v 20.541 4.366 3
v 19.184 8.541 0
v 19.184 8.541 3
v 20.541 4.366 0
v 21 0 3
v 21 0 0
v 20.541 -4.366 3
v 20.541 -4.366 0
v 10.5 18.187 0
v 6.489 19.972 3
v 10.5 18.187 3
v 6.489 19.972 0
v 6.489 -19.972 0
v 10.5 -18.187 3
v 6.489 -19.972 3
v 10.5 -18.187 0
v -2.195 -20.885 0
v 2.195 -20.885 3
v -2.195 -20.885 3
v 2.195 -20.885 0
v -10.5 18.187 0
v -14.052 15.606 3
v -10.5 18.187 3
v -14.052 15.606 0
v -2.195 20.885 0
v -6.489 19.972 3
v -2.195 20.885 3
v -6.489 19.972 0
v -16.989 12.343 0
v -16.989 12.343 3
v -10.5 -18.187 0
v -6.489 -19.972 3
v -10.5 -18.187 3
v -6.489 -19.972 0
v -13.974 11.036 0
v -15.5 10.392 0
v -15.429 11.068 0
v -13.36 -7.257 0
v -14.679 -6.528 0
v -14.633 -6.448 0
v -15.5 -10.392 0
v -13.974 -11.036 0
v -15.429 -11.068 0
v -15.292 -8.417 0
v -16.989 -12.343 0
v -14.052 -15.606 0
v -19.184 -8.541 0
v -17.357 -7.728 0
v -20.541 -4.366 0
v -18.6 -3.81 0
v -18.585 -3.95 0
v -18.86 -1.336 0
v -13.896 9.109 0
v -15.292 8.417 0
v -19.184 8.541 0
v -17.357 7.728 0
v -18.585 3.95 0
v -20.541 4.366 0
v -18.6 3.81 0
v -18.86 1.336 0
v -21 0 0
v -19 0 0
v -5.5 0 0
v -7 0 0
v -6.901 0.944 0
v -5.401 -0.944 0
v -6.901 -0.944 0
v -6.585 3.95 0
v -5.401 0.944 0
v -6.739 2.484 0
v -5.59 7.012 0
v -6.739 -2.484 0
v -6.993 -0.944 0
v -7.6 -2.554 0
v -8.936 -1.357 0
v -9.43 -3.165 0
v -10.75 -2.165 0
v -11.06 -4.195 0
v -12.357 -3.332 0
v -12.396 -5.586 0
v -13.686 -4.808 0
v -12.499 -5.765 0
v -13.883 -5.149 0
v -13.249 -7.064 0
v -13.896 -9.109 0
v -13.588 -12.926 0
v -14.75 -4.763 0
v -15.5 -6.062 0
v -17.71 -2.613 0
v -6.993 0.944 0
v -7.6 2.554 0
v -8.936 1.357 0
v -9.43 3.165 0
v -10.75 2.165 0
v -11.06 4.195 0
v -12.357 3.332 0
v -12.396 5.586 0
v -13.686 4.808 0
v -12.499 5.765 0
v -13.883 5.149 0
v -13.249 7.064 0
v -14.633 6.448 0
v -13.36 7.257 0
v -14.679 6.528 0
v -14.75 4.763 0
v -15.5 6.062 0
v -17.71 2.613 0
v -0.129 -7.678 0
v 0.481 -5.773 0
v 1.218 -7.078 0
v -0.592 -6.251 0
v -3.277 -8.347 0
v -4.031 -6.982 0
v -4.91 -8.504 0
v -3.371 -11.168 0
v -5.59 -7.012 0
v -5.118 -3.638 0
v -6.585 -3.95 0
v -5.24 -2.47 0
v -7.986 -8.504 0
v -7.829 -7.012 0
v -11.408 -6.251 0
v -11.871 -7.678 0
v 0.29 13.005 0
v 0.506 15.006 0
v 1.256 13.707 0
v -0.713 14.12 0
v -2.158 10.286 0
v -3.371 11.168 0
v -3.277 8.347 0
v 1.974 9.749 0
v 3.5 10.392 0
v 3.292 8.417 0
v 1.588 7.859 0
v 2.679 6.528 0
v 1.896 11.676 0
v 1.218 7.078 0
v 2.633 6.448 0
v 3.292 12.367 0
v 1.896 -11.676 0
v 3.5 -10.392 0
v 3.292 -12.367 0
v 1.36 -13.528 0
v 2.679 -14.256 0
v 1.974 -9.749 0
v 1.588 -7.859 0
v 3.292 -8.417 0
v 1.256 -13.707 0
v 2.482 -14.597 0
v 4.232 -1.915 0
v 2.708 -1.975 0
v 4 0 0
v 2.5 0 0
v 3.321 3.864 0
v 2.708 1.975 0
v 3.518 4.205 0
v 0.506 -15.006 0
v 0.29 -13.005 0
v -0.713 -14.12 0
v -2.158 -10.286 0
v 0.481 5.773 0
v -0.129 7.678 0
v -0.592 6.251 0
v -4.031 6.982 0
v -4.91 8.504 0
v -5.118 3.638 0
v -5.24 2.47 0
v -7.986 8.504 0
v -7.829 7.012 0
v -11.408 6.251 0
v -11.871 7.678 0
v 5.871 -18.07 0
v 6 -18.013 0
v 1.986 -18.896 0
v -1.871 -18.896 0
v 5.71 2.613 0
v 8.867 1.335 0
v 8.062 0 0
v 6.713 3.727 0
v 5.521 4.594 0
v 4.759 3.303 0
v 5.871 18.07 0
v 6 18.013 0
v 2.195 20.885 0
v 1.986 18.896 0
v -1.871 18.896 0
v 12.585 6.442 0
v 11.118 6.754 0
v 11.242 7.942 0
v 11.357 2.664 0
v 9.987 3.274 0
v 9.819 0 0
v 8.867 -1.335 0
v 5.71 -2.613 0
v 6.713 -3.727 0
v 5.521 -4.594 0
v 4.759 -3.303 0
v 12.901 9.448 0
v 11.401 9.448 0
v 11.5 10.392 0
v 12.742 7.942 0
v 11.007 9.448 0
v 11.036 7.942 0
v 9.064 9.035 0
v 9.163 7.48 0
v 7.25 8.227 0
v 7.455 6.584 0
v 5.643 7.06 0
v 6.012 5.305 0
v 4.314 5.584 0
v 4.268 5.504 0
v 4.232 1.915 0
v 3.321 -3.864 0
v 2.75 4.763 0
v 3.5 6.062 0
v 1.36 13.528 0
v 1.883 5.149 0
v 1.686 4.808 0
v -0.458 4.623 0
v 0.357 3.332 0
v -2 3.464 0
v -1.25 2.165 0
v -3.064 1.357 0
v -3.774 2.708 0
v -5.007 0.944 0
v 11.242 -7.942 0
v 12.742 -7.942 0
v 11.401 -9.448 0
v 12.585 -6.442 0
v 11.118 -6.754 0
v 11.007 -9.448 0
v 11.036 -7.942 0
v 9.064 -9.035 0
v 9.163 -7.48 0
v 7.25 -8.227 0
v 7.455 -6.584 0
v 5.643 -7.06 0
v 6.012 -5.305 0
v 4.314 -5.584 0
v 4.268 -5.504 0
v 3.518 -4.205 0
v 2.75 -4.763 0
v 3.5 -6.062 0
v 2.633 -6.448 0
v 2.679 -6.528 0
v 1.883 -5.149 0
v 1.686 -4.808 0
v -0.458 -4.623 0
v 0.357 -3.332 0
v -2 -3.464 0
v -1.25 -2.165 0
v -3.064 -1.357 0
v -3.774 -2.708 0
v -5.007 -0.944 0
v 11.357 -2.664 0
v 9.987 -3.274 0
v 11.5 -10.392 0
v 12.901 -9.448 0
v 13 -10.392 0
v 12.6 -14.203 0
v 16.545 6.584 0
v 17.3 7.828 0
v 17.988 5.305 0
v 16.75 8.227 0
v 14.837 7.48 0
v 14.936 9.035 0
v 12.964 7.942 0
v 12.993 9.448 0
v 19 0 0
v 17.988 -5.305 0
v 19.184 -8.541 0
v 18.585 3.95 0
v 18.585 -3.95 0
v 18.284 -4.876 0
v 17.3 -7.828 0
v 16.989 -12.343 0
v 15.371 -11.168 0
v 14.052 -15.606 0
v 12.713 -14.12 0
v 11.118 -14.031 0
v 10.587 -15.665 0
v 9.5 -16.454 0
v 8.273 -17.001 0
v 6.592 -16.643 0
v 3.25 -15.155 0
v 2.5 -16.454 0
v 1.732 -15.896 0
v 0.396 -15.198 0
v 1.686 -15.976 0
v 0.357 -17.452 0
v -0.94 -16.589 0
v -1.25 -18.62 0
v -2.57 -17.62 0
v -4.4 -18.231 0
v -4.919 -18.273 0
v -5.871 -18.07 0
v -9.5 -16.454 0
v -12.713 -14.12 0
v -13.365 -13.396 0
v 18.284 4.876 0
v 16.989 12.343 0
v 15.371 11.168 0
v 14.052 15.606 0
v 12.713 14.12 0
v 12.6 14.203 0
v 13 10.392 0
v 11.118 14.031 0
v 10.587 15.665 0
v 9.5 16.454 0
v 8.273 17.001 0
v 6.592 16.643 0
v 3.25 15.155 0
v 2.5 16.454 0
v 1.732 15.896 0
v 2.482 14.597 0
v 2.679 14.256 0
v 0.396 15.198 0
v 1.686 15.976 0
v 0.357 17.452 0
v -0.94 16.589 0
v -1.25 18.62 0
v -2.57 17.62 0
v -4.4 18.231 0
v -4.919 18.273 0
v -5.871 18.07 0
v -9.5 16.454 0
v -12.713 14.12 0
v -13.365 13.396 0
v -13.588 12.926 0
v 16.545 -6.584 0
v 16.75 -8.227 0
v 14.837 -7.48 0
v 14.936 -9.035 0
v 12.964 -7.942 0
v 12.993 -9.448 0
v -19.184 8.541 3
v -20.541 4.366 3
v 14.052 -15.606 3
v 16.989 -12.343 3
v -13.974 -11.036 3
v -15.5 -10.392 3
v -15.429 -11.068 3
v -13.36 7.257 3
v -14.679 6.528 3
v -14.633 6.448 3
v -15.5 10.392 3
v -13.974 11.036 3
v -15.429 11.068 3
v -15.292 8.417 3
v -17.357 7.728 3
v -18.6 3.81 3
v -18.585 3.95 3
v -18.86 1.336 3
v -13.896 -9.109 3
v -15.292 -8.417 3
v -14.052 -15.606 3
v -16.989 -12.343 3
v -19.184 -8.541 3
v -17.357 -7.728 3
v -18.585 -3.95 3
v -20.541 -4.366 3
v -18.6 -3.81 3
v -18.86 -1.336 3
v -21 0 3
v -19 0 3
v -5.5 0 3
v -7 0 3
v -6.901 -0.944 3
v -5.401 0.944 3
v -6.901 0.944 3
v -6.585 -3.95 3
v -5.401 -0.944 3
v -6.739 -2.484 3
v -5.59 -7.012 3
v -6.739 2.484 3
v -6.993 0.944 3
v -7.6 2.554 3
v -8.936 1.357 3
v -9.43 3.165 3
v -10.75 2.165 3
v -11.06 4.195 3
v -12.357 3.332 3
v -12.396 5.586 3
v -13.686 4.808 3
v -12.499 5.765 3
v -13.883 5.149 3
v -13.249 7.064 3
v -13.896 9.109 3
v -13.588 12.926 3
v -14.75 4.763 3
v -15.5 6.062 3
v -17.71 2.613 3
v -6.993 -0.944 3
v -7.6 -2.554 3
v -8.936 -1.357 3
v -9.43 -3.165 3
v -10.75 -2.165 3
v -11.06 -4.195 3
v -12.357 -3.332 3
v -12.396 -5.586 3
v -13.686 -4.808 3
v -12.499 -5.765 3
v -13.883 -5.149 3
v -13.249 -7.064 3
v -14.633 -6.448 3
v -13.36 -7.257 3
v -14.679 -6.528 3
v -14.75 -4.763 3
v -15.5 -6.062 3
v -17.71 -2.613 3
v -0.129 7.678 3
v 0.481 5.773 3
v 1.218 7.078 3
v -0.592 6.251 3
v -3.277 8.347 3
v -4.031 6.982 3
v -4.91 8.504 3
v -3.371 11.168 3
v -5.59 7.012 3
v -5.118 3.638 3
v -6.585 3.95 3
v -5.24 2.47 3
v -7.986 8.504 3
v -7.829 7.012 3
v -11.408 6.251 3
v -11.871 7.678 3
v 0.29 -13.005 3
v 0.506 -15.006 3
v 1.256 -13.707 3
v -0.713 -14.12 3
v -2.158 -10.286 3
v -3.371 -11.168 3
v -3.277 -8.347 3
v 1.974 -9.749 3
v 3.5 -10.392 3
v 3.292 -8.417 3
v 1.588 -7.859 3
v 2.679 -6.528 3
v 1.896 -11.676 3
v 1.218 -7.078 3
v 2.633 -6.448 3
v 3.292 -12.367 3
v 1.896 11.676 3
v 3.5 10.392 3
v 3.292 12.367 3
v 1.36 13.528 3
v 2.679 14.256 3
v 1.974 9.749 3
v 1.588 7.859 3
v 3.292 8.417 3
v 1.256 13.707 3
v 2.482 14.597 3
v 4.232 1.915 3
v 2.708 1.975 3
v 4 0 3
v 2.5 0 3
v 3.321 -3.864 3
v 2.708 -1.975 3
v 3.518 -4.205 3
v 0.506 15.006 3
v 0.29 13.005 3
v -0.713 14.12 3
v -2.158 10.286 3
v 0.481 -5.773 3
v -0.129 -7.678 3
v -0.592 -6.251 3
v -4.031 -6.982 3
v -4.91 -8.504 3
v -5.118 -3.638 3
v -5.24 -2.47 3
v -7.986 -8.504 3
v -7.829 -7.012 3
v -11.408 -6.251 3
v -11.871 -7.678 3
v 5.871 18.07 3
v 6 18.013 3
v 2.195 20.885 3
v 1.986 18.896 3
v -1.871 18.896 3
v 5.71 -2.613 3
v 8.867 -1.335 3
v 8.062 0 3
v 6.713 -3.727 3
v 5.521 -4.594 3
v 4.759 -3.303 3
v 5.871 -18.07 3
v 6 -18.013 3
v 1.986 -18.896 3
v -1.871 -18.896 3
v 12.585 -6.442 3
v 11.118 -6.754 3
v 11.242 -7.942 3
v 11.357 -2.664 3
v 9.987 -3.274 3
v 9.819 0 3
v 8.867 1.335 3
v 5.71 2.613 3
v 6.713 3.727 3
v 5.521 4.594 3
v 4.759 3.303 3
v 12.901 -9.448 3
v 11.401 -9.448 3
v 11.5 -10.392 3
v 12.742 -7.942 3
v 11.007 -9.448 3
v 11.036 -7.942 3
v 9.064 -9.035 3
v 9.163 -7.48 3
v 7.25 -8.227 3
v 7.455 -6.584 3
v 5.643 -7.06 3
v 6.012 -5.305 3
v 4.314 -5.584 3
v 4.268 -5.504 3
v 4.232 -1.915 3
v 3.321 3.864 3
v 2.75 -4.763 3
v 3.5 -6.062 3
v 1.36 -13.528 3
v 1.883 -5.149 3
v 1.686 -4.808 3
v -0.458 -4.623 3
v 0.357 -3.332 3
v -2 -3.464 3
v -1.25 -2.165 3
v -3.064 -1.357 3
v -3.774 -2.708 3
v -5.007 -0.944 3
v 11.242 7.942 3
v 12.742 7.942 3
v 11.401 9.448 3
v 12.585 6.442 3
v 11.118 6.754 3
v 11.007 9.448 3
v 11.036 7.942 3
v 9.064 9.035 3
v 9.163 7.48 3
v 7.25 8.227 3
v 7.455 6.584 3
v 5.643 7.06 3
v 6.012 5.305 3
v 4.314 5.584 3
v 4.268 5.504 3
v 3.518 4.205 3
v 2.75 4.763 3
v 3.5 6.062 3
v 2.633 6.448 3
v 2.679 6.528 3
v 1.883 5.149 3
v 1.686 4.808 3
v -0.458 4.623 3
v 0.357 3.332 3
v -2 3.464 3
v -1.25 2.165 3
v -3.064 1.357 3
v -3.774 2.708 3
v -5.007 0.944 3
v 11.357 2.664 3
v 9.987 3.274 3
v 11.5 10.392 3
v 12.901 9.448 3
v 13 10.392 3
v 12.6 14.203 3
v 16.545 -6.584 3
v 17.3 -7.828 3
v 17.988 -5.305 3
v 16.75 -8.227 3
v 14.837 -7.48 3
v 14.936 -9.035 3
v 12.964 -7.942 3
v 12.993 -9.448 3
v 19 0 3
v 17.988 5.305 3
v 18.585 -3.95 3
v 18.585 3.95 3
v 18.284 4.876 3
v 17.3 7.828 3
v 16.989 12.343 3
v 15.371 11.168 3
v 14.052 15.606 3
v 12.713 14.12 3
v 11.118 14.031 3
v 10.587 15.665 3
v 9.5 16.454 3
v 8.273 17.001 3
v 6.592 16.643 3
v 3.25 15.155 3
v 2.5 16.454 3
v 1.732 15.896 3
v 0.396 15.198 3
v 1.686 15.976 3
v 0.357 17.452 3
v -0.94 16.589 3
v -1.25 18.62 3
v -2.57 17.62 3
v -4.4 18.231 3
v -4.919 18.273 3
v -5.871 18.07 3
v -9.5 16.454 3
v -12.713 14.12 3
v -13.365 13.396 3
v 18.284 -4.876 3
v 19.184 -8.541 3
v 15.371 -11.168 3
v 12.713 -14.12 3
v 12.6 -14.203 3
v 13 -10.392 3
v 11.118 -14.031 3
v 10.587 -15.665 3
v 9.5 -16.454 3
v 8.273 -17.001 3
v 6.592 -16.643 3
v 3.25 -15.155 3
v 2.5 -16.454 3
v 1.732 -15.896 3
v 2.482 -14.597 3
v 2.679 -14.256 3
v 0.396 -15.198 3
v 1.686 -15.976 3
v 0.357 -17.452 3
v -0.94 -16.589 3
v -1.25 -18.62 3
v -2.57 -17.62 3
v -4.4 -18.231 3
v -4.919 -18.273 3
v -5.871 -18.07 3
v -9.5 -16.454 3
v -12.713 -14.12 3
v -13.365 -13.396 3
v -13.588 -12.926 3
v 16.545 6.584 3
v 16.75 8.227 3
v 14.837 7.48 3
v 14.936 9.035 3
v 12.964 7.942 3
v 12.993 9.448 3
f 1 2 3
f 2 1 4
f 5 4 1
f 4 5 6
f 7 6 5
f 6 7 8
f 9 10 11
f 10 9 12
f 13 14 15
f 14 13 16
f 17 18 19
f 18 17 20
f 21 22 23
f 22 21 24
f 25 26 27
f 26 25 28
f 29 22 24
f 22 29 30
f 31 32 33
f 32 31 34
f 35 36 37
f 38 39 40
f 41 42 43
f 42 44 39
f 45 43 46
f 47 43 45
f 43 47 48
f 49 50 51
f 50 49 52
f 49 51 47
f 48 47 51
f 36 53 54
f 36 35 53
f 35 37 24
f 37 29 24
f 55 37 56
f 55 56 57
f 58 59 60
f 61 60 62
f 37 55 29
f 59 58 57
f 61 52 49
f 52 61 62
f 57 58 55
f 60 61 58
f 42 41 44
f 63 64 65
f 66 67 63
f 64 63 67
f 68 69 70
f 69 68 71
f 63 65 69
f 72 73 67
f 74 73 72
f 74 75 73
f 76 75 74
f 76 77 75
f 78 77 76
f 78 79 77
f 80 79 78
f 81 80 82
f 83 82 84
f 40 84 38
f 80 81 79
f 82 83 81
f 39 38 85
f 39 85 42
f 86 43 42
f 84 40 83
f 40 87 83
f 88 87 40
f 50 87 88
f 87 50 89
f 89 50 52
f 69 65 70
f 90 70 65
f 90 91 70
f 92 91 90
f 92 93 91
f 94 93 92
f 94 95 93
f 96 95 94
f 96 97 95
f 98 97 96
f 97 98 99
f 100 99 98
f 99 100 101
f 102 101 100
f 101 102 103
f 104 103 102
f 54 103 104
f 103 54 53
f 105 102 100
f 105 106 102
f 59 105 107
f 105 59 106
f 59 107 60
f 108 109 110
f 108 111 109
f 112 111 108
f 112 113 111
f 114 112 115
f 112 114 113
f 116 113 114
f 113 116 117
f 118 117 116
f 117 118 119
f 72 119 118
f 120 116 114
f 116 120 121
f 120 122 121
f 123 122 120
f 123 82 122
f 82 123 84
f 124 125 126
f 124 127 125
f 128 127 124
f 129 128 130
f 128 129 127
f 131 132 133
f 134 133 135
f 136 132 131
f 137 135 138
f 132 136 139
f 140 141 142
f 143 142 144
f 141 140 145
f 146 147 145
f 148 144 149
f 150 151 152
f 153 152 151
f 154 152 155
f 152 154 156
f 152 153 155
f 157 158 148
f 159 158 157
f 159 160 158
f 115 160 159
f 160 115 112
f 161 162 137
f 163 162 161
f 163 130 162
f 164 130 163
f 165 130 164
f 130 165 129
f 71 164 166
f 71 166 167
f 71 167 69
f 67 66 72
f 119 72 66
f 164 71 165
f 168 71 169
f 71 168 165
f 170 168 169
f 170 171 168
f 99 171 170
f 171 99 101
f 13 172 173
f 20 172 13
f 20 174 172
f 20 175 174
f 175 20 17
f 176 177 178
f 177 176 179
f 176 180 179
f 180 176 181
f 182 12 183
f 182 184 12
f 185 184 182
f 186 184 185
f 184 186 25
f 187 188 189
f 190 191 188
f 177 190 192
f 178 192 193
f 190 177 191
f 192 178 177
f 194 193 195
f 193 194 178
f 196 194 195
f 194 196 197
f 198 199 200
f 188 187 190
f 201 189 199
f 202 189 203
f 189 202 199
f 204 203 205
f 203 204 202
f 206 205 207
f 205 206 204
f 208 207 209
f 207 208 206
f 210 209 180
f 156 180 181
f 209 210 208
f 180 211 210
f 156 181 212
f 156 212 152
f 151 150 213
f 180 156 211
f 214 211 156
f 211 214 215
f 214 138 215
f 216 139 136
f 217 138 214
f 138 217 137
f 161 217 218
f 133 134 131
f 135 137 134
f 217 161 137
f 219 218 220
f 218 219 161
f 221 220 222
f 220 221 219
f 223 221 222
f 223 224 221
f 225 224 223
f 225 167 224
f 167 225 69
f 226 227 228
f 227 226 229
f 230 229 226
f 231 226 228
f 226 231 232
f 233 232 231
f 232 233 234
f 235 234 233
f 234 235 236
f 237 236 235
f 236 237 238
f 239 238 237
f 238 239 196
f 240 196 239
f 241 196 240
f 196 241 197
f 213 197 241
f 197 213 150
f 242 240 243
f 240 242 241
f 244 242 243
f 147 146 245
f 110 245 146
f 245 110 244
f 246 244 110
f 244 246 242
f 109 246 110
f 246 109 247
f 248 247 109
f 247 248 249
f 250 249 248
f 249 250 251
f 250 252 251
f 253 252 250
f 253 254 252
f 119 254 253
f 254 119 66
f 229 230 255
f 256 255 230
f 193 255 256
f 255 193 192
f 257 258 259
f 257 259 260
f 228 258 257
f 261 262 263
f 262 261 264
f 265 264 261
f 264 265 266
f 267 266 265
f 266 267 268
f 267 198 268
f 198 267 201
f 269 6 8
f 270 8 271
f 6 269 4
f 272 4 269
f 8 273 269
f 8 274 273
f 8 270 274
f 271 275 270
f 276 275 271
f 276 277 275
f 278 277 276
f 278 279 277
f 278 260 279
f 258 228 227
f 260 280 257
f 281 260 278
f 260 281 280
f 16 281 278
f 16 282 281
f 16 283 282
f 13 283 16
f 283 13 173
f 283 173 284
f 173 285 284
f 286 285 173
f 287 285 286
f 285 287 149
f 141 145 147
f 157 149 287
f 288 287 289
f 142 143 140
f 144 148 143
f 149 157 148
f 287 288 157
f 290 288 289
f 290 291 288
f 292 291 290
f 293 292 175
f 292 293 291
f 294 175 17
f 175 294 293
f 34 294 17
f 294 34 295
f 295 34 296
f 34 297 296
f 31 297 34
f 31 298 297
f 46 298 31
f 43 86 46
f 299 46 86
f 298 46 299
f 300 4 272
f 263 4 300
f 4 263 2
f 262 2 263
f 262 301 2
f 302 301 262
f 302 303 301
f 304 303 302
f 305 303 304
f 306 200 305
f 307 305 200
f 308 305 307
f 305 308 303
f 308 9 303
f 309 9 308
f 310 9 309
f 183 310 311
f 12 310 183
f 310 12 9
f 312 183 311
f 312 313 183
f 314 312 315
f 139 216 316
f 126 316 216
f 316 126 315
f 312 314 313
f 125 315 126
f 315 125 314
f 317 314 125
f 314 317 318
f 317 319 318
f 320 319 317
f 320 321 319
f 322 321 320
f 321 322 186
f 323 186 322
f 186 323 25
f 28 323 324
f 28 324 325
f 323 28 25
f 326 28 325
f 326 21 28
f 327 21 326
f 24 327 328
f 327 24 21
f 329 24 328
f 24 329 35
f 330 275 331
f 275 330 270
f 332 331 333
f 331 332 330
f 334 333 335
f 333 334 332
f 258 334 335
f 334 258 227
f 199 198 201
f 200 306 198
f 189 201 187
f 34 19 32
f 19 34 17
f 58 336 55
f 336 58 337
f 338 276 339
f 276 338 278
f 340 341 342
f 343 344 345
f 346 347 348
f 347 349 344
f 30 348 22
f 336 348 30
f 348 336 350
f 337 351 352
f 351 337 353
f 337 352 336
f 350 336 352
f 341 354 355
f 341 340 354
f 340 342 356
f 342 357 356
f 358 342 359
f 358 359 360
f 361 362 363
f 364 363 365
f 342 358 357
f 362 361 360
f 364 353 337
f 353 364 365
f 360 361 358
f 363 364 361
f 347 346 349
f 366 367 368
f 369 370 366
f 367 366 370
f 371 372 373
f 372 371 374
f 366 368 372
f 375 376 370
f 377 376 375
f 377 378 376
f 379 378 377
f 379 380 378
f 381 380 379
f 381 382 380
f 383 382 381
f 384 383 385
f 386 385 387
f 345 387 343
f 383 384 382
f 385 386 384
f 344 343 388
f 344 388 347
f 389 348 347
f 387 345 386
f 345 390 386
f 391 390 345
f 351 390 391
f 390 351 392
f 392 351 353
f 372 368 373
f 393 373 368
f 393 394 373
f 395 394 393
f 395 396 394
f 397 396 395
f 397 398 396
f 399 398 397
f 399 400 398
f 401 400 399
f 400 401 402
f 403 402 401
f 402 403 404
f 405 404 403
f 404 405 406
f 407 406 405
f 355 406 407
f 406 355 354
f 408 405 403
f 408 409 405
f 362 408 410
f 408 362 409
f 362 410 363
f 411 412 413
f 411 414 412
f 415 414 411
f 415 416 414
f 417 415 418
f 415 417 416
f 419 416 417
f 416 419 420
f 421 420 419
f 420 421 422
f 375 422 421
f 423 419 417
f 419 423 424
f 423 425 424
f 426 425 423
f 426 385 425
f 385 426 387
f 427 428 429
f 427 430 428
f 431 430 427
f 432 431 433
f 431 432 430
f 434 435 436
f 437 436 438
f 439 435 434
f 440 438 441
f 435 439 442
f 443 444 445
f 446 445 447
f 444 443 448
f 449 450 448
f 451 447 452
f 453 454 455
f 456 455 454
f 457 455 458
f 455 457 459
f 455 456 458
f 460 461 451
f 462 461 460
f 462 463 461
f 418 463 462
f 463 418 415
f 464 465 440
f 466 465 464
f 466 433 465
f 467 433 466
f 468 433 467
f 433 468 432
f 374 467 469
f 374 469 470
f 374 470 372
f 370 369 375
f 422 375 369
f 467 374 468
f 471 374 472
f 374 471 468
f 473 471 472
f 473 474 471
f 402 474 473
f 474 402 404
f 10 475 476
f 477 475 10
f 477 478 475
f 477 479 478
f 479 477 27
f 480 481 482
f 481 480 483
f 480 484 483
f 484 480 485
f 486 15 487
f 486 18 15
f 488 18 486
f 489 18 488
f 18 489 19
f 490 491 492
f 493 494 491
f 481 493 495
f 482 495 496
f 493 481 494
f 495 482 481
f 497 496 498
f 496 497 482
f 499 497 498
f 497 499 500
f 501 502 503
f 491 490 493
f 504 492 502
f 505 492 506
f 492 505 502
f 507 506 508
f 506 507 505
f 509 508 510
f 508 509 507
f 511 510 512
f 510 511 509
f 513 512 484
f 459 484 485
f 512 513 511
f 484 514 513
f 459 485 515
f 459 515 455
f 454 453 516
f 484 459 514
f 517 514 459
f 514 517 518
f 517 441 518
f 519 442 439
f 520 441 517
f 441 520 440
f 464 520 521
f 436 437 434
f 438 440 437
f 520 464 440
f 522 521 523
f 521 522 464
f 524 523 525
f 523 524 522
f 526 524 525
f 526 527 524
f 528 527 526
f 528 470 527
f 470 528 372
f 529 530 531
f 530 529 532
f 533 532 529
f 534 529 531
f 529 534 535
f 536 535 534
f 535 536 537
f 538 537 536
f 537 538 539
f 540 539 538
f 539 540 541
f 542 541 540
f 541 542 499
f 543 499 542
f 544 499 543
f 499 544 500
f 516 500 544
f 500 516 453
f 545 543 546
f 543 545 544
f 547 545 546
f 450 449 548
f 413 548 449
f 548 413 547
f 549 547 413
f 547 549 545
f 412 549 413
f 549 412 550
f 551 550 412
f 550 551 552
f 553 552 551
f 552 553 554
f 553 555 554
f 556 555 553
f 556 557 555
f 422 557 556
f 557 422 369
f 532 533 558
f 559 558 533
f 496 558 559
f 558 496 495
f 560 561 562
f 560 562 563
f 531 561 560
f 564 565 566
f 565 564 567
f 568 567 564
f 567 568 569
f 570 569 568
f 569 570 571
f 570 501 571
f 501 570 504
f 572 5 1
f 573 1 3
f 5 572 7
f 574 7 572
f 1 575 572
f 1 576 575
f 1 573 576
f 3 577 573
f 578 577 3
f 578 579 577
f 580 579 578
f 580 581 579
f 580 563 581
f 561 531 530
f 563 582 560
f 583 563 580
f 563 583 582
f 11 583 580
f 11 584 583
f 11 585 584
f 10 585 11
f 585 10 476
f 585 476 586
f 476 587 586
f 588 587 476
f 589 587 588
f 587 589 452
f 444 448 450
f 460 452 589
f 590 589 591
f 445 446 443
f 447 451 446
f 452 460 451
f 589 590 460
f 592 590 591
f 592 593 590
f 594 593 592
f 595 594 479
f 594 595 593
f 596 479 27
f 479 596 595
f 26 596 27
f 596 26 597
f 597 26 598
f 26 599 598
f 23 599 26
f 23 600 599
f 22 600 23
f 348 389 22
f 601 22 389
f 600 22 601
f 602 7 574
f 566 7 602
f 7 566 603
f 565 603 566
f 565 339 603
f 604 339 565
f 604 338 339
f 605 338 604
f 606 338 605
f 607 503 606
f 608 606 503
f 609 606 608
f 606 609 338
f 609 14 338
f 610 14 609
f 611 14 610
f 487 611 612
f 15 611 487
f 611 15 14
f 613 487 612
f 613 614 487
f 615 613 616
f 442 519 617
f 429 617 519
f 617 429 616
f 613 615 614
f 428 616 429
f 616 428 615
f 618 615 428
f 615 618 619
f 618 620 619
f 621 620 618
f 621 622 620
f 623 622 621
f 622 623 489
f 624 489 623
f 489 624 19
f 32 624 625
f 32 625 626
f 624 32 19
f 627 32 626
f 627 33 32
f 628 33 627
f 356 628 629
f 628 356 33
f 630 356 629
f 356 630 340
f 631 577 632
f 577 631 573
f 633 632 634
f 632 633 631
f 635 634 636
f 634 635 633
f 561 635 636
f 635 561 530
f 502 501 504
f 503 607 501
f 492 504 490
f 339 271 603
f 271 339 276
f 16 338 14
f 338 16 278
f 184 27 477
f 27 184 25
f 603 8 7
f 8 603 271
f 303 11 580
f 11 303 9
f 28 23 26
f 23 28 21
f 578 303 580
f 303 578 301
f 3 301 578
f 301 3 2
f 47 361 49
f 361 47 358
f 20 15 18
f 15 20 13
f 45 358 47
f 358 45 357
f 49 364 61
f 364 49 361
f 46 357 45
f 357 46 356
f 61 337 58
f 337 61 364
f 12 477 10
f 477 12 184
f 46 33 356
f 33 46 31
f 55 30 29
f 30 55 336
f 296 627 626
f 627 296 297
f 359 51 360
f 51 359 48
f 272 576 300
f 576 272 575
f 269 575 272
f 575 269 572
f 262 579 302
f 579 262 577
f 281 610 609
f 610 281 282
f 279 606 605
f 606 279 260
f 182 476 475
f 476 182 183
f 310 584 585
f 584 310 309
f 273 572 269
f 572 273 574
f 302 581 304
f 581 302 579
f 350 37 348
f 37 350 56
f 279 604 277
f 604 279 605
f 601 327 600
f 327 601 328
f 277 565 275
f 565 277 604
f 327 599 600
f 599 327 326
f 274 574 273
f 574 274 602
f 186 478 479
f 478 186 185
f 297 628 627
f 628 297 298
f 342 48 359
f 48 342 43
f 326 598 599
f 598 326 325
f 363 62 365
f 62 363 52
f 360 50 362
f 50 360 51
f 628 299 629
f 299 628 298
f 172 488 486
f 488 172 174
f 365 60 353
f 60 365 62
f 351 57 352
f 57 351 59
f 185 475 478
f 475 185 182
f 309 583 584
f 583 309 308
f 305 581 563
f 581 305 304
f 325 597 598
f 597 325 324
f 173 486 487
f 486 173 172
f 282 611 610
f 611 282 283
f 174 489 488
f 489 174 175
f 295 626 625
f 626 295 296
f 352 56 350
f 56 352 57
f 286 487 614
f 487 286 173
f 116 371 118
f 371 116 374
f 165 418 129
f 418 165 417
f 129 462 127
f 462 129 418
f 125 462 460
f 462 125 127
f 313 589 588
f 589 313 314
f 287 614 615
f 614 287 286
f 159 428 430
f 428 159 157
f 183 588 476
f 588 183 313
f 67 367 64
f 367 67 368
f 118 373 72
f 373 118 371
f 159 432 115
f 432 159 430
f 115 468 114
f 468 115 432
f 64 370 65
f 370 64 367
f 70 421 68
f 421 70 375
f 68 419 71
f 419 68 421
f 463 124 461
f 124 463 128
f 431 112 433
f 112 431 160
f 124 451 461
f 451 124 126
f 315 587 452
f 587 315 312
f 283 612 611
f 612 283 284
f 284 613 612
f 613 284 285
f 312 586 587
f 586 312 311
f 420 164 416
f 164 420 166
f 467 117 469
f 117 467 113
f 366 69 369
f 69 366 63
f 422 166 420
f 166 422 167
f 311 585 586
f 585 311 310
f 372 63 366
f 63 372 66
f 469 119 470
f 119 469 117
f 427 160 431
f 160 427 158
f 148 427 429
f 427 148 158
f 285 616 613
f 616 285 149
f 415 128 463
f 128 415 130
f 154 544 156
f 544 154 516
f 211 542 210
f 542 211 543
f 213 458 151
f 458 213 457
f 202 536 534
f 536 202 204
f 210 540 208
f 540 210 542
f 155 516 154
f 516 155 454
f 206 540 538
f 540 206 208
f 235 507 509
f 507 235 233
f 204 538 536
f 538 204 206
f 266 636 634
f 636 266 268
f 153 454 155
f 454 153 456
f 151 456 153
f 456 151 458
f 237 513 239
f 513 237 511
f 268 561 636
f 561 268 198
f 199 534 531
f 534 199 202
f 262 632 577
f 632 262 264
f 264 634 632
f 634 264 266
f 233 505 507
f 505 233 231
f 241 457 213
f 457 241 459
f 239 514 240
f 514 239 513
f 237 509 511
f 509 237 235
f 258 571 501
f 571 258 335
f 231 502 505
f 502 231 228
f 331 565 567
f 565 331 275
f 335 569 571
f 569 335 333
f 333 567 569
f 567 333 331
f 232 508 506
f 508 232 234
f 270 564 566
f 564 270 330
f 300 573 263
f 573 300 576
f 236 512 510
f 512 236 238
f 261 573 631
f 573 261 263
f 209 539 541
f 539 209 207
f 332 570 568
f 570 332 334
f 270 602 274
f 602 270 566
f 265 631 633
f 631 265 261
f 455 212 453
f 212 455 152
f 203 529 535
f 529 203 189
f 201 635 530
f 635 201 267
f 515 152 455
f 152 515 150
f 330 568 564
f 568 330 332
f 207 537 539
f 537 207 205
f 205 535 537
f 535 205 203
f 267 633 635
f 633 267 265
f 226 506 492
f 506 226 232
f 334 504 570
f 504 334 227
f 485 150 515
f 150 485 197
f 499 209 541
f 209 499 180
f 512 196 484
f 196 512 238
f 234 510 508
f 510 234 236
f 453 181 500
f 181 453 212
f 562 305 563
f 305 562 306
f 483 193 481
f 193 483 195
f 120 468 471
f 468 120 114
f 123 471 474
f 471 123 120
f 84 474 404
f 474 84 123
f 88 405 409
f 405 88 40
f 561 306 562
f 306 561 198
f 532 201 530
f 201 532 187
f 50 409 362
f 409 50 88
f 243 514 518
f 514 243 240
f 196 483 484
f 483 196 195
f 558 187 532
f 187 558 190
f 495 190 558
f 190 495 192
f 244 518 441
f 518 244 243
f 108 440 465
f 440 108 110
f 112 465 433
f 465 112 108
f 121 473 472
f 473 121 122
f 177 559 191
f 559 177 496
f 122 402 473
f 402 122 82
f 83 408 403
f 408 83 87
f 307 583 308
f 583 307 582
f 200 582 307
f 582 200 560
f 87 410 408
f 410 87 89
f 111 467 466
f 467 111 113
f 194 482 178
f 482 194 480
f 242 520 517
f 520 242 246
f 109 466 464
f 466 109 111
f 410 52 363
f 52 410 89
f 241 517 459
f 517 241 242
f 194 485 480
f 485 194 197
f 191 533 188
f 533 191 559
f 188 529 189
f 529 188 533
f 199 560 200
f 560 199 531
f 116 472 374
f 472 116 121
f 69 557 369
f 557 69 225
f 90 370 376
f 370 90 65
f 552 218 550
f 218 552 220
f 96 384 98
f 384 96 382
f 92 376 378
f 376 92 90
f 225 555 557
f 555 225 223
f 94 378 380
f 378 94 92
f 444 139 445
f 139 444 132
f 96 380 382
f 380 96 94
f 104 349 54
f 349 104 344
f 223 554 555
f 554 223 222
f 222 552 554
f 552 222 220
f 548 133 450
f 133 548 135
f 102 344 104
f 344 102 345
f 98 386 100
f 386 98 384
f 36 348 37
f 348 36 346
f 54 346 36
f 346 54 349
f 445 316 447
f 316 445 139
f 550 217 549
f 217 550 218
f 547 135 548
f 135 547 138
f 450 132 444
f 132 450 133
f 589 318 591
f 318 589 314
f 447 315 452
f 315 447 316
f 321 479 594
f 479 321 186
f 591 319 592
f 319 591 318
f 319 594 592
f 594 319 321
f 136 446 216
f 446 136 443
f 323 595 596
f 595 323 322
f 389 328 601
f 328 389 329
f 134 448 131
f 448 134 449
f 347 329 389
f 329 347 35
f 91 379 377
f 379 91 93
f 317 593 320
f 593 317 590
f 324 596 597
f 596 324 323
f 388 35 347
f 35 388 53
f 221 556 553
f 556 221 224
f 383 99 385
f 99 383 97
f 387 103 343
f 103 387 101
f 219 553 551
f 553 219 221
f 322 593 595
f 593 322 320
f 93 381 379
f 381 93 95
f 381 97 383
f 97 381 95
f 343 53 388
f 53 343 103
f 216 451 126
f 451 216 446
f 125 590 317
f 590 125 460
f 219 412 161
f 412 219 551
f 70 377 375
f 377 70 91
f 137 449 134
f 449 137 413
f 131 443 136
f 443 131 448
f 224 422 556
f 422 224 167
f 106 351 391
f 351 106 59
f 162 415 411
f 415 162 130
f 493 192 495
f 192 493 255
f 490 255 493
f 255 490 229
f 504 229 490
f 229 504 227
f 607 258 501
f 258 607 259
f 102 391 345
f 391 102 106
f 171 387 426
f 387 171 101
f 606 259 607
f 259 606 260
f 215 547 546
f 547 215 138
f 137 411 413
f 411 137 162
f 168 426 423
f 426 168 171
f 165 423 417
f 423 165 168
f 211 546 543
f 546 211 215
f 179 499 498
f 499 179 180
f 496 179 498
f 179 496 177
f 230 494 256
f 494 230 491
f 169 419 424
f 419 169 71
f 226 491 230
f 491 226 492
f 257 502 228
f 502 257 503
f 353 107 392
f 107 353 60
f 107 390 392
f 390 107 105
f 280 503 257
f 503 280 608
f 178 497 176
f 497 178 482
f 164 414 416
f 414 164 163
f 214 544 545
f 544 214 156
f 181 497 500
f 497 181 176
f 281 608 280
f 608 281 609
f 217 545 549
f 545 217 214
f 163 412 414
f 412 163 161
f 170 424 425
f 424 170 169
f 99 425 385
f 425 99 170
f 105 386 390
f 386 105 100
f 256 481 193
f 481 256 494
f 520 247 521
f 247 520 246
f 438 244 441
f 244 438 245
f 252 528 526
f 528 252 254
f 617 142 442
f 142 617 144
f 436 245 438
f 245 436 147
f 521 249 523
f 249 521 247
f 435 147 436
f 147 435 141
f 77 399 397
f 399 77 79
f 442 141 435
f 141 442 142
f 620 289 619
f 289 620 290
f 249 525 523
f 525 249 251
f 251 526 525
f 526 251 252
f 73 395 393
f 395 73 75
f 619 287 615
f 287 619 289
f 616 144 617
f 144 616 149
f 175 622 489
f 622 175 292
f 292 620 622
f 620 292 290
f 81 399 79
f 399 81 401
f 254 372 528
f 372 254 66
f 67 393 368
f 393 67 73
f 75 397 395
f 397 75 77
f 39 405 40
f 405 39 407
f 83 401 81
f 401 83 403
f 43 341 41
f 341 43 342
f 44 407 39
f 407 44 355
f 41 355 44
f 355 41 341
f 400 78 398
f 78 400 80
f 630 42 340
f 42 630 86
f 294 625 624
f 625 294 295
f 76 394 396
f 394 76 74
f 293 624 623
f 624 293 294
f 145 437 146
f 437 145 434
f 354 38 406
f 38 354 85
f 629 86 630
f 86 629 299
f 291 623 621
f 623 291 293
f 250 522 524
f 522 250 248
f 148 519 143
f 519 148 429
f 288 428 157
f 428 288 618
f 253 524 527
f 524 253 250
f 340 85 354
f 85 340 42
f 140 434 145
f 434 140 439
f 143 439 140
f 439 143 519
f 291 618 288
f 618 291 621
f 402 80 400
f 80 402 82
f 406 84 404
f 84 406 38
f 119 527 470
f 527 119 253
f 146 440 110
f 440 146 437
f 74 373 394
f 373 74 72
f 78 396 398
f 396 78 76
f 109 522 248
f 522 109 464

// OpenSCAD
module concentrics(r, tbar, tgap, z) {
  for (i = [0:(tbar+tgap):(r/2)]) {
      difference() {
	cylinder(r=r/2-i, h=z);
	translate([0,0,-1])
	  cylinder(r=r/2-i-tbar, h=z+2);
      }
    }
}


module moire(r, tbar, tgap, z, s) {
  concentrics(r, tbar, tgap, z);
  translate([s,0,0])
    concentrics(r, tbar, tgap, z);
}

module trimoire(r, tbar, tgap, z, s) {
  for  (i = [0:120:359]) {
    rotate([0,0,i])
      translate([s,0,0])
      concentrics(r, tbar, tgap, z);
  }

}



module pentmoire(r, tbar, tgap, z, s) {

  for (i = [0:72:359]) {
    rotate([0,0,i])
      translate([s,0,0])
      concentrics(r, tbar, tgap, z);
  }
}



//translate([50, 50, 0]) concentrics(20, 1,2, 3);
//$fn=50;
//pentmoire(38, 2, 10, 3, 8);

difference() {
  cylinder(r=42/2, h=3);
  translate([0,0,-1])
  cylinder(r=38/2, h=5);
}
intersection() {
  cylinder(r=38/2, h=3);
  trimoire(38, 1.5, 8, 3, 12);
}
 
